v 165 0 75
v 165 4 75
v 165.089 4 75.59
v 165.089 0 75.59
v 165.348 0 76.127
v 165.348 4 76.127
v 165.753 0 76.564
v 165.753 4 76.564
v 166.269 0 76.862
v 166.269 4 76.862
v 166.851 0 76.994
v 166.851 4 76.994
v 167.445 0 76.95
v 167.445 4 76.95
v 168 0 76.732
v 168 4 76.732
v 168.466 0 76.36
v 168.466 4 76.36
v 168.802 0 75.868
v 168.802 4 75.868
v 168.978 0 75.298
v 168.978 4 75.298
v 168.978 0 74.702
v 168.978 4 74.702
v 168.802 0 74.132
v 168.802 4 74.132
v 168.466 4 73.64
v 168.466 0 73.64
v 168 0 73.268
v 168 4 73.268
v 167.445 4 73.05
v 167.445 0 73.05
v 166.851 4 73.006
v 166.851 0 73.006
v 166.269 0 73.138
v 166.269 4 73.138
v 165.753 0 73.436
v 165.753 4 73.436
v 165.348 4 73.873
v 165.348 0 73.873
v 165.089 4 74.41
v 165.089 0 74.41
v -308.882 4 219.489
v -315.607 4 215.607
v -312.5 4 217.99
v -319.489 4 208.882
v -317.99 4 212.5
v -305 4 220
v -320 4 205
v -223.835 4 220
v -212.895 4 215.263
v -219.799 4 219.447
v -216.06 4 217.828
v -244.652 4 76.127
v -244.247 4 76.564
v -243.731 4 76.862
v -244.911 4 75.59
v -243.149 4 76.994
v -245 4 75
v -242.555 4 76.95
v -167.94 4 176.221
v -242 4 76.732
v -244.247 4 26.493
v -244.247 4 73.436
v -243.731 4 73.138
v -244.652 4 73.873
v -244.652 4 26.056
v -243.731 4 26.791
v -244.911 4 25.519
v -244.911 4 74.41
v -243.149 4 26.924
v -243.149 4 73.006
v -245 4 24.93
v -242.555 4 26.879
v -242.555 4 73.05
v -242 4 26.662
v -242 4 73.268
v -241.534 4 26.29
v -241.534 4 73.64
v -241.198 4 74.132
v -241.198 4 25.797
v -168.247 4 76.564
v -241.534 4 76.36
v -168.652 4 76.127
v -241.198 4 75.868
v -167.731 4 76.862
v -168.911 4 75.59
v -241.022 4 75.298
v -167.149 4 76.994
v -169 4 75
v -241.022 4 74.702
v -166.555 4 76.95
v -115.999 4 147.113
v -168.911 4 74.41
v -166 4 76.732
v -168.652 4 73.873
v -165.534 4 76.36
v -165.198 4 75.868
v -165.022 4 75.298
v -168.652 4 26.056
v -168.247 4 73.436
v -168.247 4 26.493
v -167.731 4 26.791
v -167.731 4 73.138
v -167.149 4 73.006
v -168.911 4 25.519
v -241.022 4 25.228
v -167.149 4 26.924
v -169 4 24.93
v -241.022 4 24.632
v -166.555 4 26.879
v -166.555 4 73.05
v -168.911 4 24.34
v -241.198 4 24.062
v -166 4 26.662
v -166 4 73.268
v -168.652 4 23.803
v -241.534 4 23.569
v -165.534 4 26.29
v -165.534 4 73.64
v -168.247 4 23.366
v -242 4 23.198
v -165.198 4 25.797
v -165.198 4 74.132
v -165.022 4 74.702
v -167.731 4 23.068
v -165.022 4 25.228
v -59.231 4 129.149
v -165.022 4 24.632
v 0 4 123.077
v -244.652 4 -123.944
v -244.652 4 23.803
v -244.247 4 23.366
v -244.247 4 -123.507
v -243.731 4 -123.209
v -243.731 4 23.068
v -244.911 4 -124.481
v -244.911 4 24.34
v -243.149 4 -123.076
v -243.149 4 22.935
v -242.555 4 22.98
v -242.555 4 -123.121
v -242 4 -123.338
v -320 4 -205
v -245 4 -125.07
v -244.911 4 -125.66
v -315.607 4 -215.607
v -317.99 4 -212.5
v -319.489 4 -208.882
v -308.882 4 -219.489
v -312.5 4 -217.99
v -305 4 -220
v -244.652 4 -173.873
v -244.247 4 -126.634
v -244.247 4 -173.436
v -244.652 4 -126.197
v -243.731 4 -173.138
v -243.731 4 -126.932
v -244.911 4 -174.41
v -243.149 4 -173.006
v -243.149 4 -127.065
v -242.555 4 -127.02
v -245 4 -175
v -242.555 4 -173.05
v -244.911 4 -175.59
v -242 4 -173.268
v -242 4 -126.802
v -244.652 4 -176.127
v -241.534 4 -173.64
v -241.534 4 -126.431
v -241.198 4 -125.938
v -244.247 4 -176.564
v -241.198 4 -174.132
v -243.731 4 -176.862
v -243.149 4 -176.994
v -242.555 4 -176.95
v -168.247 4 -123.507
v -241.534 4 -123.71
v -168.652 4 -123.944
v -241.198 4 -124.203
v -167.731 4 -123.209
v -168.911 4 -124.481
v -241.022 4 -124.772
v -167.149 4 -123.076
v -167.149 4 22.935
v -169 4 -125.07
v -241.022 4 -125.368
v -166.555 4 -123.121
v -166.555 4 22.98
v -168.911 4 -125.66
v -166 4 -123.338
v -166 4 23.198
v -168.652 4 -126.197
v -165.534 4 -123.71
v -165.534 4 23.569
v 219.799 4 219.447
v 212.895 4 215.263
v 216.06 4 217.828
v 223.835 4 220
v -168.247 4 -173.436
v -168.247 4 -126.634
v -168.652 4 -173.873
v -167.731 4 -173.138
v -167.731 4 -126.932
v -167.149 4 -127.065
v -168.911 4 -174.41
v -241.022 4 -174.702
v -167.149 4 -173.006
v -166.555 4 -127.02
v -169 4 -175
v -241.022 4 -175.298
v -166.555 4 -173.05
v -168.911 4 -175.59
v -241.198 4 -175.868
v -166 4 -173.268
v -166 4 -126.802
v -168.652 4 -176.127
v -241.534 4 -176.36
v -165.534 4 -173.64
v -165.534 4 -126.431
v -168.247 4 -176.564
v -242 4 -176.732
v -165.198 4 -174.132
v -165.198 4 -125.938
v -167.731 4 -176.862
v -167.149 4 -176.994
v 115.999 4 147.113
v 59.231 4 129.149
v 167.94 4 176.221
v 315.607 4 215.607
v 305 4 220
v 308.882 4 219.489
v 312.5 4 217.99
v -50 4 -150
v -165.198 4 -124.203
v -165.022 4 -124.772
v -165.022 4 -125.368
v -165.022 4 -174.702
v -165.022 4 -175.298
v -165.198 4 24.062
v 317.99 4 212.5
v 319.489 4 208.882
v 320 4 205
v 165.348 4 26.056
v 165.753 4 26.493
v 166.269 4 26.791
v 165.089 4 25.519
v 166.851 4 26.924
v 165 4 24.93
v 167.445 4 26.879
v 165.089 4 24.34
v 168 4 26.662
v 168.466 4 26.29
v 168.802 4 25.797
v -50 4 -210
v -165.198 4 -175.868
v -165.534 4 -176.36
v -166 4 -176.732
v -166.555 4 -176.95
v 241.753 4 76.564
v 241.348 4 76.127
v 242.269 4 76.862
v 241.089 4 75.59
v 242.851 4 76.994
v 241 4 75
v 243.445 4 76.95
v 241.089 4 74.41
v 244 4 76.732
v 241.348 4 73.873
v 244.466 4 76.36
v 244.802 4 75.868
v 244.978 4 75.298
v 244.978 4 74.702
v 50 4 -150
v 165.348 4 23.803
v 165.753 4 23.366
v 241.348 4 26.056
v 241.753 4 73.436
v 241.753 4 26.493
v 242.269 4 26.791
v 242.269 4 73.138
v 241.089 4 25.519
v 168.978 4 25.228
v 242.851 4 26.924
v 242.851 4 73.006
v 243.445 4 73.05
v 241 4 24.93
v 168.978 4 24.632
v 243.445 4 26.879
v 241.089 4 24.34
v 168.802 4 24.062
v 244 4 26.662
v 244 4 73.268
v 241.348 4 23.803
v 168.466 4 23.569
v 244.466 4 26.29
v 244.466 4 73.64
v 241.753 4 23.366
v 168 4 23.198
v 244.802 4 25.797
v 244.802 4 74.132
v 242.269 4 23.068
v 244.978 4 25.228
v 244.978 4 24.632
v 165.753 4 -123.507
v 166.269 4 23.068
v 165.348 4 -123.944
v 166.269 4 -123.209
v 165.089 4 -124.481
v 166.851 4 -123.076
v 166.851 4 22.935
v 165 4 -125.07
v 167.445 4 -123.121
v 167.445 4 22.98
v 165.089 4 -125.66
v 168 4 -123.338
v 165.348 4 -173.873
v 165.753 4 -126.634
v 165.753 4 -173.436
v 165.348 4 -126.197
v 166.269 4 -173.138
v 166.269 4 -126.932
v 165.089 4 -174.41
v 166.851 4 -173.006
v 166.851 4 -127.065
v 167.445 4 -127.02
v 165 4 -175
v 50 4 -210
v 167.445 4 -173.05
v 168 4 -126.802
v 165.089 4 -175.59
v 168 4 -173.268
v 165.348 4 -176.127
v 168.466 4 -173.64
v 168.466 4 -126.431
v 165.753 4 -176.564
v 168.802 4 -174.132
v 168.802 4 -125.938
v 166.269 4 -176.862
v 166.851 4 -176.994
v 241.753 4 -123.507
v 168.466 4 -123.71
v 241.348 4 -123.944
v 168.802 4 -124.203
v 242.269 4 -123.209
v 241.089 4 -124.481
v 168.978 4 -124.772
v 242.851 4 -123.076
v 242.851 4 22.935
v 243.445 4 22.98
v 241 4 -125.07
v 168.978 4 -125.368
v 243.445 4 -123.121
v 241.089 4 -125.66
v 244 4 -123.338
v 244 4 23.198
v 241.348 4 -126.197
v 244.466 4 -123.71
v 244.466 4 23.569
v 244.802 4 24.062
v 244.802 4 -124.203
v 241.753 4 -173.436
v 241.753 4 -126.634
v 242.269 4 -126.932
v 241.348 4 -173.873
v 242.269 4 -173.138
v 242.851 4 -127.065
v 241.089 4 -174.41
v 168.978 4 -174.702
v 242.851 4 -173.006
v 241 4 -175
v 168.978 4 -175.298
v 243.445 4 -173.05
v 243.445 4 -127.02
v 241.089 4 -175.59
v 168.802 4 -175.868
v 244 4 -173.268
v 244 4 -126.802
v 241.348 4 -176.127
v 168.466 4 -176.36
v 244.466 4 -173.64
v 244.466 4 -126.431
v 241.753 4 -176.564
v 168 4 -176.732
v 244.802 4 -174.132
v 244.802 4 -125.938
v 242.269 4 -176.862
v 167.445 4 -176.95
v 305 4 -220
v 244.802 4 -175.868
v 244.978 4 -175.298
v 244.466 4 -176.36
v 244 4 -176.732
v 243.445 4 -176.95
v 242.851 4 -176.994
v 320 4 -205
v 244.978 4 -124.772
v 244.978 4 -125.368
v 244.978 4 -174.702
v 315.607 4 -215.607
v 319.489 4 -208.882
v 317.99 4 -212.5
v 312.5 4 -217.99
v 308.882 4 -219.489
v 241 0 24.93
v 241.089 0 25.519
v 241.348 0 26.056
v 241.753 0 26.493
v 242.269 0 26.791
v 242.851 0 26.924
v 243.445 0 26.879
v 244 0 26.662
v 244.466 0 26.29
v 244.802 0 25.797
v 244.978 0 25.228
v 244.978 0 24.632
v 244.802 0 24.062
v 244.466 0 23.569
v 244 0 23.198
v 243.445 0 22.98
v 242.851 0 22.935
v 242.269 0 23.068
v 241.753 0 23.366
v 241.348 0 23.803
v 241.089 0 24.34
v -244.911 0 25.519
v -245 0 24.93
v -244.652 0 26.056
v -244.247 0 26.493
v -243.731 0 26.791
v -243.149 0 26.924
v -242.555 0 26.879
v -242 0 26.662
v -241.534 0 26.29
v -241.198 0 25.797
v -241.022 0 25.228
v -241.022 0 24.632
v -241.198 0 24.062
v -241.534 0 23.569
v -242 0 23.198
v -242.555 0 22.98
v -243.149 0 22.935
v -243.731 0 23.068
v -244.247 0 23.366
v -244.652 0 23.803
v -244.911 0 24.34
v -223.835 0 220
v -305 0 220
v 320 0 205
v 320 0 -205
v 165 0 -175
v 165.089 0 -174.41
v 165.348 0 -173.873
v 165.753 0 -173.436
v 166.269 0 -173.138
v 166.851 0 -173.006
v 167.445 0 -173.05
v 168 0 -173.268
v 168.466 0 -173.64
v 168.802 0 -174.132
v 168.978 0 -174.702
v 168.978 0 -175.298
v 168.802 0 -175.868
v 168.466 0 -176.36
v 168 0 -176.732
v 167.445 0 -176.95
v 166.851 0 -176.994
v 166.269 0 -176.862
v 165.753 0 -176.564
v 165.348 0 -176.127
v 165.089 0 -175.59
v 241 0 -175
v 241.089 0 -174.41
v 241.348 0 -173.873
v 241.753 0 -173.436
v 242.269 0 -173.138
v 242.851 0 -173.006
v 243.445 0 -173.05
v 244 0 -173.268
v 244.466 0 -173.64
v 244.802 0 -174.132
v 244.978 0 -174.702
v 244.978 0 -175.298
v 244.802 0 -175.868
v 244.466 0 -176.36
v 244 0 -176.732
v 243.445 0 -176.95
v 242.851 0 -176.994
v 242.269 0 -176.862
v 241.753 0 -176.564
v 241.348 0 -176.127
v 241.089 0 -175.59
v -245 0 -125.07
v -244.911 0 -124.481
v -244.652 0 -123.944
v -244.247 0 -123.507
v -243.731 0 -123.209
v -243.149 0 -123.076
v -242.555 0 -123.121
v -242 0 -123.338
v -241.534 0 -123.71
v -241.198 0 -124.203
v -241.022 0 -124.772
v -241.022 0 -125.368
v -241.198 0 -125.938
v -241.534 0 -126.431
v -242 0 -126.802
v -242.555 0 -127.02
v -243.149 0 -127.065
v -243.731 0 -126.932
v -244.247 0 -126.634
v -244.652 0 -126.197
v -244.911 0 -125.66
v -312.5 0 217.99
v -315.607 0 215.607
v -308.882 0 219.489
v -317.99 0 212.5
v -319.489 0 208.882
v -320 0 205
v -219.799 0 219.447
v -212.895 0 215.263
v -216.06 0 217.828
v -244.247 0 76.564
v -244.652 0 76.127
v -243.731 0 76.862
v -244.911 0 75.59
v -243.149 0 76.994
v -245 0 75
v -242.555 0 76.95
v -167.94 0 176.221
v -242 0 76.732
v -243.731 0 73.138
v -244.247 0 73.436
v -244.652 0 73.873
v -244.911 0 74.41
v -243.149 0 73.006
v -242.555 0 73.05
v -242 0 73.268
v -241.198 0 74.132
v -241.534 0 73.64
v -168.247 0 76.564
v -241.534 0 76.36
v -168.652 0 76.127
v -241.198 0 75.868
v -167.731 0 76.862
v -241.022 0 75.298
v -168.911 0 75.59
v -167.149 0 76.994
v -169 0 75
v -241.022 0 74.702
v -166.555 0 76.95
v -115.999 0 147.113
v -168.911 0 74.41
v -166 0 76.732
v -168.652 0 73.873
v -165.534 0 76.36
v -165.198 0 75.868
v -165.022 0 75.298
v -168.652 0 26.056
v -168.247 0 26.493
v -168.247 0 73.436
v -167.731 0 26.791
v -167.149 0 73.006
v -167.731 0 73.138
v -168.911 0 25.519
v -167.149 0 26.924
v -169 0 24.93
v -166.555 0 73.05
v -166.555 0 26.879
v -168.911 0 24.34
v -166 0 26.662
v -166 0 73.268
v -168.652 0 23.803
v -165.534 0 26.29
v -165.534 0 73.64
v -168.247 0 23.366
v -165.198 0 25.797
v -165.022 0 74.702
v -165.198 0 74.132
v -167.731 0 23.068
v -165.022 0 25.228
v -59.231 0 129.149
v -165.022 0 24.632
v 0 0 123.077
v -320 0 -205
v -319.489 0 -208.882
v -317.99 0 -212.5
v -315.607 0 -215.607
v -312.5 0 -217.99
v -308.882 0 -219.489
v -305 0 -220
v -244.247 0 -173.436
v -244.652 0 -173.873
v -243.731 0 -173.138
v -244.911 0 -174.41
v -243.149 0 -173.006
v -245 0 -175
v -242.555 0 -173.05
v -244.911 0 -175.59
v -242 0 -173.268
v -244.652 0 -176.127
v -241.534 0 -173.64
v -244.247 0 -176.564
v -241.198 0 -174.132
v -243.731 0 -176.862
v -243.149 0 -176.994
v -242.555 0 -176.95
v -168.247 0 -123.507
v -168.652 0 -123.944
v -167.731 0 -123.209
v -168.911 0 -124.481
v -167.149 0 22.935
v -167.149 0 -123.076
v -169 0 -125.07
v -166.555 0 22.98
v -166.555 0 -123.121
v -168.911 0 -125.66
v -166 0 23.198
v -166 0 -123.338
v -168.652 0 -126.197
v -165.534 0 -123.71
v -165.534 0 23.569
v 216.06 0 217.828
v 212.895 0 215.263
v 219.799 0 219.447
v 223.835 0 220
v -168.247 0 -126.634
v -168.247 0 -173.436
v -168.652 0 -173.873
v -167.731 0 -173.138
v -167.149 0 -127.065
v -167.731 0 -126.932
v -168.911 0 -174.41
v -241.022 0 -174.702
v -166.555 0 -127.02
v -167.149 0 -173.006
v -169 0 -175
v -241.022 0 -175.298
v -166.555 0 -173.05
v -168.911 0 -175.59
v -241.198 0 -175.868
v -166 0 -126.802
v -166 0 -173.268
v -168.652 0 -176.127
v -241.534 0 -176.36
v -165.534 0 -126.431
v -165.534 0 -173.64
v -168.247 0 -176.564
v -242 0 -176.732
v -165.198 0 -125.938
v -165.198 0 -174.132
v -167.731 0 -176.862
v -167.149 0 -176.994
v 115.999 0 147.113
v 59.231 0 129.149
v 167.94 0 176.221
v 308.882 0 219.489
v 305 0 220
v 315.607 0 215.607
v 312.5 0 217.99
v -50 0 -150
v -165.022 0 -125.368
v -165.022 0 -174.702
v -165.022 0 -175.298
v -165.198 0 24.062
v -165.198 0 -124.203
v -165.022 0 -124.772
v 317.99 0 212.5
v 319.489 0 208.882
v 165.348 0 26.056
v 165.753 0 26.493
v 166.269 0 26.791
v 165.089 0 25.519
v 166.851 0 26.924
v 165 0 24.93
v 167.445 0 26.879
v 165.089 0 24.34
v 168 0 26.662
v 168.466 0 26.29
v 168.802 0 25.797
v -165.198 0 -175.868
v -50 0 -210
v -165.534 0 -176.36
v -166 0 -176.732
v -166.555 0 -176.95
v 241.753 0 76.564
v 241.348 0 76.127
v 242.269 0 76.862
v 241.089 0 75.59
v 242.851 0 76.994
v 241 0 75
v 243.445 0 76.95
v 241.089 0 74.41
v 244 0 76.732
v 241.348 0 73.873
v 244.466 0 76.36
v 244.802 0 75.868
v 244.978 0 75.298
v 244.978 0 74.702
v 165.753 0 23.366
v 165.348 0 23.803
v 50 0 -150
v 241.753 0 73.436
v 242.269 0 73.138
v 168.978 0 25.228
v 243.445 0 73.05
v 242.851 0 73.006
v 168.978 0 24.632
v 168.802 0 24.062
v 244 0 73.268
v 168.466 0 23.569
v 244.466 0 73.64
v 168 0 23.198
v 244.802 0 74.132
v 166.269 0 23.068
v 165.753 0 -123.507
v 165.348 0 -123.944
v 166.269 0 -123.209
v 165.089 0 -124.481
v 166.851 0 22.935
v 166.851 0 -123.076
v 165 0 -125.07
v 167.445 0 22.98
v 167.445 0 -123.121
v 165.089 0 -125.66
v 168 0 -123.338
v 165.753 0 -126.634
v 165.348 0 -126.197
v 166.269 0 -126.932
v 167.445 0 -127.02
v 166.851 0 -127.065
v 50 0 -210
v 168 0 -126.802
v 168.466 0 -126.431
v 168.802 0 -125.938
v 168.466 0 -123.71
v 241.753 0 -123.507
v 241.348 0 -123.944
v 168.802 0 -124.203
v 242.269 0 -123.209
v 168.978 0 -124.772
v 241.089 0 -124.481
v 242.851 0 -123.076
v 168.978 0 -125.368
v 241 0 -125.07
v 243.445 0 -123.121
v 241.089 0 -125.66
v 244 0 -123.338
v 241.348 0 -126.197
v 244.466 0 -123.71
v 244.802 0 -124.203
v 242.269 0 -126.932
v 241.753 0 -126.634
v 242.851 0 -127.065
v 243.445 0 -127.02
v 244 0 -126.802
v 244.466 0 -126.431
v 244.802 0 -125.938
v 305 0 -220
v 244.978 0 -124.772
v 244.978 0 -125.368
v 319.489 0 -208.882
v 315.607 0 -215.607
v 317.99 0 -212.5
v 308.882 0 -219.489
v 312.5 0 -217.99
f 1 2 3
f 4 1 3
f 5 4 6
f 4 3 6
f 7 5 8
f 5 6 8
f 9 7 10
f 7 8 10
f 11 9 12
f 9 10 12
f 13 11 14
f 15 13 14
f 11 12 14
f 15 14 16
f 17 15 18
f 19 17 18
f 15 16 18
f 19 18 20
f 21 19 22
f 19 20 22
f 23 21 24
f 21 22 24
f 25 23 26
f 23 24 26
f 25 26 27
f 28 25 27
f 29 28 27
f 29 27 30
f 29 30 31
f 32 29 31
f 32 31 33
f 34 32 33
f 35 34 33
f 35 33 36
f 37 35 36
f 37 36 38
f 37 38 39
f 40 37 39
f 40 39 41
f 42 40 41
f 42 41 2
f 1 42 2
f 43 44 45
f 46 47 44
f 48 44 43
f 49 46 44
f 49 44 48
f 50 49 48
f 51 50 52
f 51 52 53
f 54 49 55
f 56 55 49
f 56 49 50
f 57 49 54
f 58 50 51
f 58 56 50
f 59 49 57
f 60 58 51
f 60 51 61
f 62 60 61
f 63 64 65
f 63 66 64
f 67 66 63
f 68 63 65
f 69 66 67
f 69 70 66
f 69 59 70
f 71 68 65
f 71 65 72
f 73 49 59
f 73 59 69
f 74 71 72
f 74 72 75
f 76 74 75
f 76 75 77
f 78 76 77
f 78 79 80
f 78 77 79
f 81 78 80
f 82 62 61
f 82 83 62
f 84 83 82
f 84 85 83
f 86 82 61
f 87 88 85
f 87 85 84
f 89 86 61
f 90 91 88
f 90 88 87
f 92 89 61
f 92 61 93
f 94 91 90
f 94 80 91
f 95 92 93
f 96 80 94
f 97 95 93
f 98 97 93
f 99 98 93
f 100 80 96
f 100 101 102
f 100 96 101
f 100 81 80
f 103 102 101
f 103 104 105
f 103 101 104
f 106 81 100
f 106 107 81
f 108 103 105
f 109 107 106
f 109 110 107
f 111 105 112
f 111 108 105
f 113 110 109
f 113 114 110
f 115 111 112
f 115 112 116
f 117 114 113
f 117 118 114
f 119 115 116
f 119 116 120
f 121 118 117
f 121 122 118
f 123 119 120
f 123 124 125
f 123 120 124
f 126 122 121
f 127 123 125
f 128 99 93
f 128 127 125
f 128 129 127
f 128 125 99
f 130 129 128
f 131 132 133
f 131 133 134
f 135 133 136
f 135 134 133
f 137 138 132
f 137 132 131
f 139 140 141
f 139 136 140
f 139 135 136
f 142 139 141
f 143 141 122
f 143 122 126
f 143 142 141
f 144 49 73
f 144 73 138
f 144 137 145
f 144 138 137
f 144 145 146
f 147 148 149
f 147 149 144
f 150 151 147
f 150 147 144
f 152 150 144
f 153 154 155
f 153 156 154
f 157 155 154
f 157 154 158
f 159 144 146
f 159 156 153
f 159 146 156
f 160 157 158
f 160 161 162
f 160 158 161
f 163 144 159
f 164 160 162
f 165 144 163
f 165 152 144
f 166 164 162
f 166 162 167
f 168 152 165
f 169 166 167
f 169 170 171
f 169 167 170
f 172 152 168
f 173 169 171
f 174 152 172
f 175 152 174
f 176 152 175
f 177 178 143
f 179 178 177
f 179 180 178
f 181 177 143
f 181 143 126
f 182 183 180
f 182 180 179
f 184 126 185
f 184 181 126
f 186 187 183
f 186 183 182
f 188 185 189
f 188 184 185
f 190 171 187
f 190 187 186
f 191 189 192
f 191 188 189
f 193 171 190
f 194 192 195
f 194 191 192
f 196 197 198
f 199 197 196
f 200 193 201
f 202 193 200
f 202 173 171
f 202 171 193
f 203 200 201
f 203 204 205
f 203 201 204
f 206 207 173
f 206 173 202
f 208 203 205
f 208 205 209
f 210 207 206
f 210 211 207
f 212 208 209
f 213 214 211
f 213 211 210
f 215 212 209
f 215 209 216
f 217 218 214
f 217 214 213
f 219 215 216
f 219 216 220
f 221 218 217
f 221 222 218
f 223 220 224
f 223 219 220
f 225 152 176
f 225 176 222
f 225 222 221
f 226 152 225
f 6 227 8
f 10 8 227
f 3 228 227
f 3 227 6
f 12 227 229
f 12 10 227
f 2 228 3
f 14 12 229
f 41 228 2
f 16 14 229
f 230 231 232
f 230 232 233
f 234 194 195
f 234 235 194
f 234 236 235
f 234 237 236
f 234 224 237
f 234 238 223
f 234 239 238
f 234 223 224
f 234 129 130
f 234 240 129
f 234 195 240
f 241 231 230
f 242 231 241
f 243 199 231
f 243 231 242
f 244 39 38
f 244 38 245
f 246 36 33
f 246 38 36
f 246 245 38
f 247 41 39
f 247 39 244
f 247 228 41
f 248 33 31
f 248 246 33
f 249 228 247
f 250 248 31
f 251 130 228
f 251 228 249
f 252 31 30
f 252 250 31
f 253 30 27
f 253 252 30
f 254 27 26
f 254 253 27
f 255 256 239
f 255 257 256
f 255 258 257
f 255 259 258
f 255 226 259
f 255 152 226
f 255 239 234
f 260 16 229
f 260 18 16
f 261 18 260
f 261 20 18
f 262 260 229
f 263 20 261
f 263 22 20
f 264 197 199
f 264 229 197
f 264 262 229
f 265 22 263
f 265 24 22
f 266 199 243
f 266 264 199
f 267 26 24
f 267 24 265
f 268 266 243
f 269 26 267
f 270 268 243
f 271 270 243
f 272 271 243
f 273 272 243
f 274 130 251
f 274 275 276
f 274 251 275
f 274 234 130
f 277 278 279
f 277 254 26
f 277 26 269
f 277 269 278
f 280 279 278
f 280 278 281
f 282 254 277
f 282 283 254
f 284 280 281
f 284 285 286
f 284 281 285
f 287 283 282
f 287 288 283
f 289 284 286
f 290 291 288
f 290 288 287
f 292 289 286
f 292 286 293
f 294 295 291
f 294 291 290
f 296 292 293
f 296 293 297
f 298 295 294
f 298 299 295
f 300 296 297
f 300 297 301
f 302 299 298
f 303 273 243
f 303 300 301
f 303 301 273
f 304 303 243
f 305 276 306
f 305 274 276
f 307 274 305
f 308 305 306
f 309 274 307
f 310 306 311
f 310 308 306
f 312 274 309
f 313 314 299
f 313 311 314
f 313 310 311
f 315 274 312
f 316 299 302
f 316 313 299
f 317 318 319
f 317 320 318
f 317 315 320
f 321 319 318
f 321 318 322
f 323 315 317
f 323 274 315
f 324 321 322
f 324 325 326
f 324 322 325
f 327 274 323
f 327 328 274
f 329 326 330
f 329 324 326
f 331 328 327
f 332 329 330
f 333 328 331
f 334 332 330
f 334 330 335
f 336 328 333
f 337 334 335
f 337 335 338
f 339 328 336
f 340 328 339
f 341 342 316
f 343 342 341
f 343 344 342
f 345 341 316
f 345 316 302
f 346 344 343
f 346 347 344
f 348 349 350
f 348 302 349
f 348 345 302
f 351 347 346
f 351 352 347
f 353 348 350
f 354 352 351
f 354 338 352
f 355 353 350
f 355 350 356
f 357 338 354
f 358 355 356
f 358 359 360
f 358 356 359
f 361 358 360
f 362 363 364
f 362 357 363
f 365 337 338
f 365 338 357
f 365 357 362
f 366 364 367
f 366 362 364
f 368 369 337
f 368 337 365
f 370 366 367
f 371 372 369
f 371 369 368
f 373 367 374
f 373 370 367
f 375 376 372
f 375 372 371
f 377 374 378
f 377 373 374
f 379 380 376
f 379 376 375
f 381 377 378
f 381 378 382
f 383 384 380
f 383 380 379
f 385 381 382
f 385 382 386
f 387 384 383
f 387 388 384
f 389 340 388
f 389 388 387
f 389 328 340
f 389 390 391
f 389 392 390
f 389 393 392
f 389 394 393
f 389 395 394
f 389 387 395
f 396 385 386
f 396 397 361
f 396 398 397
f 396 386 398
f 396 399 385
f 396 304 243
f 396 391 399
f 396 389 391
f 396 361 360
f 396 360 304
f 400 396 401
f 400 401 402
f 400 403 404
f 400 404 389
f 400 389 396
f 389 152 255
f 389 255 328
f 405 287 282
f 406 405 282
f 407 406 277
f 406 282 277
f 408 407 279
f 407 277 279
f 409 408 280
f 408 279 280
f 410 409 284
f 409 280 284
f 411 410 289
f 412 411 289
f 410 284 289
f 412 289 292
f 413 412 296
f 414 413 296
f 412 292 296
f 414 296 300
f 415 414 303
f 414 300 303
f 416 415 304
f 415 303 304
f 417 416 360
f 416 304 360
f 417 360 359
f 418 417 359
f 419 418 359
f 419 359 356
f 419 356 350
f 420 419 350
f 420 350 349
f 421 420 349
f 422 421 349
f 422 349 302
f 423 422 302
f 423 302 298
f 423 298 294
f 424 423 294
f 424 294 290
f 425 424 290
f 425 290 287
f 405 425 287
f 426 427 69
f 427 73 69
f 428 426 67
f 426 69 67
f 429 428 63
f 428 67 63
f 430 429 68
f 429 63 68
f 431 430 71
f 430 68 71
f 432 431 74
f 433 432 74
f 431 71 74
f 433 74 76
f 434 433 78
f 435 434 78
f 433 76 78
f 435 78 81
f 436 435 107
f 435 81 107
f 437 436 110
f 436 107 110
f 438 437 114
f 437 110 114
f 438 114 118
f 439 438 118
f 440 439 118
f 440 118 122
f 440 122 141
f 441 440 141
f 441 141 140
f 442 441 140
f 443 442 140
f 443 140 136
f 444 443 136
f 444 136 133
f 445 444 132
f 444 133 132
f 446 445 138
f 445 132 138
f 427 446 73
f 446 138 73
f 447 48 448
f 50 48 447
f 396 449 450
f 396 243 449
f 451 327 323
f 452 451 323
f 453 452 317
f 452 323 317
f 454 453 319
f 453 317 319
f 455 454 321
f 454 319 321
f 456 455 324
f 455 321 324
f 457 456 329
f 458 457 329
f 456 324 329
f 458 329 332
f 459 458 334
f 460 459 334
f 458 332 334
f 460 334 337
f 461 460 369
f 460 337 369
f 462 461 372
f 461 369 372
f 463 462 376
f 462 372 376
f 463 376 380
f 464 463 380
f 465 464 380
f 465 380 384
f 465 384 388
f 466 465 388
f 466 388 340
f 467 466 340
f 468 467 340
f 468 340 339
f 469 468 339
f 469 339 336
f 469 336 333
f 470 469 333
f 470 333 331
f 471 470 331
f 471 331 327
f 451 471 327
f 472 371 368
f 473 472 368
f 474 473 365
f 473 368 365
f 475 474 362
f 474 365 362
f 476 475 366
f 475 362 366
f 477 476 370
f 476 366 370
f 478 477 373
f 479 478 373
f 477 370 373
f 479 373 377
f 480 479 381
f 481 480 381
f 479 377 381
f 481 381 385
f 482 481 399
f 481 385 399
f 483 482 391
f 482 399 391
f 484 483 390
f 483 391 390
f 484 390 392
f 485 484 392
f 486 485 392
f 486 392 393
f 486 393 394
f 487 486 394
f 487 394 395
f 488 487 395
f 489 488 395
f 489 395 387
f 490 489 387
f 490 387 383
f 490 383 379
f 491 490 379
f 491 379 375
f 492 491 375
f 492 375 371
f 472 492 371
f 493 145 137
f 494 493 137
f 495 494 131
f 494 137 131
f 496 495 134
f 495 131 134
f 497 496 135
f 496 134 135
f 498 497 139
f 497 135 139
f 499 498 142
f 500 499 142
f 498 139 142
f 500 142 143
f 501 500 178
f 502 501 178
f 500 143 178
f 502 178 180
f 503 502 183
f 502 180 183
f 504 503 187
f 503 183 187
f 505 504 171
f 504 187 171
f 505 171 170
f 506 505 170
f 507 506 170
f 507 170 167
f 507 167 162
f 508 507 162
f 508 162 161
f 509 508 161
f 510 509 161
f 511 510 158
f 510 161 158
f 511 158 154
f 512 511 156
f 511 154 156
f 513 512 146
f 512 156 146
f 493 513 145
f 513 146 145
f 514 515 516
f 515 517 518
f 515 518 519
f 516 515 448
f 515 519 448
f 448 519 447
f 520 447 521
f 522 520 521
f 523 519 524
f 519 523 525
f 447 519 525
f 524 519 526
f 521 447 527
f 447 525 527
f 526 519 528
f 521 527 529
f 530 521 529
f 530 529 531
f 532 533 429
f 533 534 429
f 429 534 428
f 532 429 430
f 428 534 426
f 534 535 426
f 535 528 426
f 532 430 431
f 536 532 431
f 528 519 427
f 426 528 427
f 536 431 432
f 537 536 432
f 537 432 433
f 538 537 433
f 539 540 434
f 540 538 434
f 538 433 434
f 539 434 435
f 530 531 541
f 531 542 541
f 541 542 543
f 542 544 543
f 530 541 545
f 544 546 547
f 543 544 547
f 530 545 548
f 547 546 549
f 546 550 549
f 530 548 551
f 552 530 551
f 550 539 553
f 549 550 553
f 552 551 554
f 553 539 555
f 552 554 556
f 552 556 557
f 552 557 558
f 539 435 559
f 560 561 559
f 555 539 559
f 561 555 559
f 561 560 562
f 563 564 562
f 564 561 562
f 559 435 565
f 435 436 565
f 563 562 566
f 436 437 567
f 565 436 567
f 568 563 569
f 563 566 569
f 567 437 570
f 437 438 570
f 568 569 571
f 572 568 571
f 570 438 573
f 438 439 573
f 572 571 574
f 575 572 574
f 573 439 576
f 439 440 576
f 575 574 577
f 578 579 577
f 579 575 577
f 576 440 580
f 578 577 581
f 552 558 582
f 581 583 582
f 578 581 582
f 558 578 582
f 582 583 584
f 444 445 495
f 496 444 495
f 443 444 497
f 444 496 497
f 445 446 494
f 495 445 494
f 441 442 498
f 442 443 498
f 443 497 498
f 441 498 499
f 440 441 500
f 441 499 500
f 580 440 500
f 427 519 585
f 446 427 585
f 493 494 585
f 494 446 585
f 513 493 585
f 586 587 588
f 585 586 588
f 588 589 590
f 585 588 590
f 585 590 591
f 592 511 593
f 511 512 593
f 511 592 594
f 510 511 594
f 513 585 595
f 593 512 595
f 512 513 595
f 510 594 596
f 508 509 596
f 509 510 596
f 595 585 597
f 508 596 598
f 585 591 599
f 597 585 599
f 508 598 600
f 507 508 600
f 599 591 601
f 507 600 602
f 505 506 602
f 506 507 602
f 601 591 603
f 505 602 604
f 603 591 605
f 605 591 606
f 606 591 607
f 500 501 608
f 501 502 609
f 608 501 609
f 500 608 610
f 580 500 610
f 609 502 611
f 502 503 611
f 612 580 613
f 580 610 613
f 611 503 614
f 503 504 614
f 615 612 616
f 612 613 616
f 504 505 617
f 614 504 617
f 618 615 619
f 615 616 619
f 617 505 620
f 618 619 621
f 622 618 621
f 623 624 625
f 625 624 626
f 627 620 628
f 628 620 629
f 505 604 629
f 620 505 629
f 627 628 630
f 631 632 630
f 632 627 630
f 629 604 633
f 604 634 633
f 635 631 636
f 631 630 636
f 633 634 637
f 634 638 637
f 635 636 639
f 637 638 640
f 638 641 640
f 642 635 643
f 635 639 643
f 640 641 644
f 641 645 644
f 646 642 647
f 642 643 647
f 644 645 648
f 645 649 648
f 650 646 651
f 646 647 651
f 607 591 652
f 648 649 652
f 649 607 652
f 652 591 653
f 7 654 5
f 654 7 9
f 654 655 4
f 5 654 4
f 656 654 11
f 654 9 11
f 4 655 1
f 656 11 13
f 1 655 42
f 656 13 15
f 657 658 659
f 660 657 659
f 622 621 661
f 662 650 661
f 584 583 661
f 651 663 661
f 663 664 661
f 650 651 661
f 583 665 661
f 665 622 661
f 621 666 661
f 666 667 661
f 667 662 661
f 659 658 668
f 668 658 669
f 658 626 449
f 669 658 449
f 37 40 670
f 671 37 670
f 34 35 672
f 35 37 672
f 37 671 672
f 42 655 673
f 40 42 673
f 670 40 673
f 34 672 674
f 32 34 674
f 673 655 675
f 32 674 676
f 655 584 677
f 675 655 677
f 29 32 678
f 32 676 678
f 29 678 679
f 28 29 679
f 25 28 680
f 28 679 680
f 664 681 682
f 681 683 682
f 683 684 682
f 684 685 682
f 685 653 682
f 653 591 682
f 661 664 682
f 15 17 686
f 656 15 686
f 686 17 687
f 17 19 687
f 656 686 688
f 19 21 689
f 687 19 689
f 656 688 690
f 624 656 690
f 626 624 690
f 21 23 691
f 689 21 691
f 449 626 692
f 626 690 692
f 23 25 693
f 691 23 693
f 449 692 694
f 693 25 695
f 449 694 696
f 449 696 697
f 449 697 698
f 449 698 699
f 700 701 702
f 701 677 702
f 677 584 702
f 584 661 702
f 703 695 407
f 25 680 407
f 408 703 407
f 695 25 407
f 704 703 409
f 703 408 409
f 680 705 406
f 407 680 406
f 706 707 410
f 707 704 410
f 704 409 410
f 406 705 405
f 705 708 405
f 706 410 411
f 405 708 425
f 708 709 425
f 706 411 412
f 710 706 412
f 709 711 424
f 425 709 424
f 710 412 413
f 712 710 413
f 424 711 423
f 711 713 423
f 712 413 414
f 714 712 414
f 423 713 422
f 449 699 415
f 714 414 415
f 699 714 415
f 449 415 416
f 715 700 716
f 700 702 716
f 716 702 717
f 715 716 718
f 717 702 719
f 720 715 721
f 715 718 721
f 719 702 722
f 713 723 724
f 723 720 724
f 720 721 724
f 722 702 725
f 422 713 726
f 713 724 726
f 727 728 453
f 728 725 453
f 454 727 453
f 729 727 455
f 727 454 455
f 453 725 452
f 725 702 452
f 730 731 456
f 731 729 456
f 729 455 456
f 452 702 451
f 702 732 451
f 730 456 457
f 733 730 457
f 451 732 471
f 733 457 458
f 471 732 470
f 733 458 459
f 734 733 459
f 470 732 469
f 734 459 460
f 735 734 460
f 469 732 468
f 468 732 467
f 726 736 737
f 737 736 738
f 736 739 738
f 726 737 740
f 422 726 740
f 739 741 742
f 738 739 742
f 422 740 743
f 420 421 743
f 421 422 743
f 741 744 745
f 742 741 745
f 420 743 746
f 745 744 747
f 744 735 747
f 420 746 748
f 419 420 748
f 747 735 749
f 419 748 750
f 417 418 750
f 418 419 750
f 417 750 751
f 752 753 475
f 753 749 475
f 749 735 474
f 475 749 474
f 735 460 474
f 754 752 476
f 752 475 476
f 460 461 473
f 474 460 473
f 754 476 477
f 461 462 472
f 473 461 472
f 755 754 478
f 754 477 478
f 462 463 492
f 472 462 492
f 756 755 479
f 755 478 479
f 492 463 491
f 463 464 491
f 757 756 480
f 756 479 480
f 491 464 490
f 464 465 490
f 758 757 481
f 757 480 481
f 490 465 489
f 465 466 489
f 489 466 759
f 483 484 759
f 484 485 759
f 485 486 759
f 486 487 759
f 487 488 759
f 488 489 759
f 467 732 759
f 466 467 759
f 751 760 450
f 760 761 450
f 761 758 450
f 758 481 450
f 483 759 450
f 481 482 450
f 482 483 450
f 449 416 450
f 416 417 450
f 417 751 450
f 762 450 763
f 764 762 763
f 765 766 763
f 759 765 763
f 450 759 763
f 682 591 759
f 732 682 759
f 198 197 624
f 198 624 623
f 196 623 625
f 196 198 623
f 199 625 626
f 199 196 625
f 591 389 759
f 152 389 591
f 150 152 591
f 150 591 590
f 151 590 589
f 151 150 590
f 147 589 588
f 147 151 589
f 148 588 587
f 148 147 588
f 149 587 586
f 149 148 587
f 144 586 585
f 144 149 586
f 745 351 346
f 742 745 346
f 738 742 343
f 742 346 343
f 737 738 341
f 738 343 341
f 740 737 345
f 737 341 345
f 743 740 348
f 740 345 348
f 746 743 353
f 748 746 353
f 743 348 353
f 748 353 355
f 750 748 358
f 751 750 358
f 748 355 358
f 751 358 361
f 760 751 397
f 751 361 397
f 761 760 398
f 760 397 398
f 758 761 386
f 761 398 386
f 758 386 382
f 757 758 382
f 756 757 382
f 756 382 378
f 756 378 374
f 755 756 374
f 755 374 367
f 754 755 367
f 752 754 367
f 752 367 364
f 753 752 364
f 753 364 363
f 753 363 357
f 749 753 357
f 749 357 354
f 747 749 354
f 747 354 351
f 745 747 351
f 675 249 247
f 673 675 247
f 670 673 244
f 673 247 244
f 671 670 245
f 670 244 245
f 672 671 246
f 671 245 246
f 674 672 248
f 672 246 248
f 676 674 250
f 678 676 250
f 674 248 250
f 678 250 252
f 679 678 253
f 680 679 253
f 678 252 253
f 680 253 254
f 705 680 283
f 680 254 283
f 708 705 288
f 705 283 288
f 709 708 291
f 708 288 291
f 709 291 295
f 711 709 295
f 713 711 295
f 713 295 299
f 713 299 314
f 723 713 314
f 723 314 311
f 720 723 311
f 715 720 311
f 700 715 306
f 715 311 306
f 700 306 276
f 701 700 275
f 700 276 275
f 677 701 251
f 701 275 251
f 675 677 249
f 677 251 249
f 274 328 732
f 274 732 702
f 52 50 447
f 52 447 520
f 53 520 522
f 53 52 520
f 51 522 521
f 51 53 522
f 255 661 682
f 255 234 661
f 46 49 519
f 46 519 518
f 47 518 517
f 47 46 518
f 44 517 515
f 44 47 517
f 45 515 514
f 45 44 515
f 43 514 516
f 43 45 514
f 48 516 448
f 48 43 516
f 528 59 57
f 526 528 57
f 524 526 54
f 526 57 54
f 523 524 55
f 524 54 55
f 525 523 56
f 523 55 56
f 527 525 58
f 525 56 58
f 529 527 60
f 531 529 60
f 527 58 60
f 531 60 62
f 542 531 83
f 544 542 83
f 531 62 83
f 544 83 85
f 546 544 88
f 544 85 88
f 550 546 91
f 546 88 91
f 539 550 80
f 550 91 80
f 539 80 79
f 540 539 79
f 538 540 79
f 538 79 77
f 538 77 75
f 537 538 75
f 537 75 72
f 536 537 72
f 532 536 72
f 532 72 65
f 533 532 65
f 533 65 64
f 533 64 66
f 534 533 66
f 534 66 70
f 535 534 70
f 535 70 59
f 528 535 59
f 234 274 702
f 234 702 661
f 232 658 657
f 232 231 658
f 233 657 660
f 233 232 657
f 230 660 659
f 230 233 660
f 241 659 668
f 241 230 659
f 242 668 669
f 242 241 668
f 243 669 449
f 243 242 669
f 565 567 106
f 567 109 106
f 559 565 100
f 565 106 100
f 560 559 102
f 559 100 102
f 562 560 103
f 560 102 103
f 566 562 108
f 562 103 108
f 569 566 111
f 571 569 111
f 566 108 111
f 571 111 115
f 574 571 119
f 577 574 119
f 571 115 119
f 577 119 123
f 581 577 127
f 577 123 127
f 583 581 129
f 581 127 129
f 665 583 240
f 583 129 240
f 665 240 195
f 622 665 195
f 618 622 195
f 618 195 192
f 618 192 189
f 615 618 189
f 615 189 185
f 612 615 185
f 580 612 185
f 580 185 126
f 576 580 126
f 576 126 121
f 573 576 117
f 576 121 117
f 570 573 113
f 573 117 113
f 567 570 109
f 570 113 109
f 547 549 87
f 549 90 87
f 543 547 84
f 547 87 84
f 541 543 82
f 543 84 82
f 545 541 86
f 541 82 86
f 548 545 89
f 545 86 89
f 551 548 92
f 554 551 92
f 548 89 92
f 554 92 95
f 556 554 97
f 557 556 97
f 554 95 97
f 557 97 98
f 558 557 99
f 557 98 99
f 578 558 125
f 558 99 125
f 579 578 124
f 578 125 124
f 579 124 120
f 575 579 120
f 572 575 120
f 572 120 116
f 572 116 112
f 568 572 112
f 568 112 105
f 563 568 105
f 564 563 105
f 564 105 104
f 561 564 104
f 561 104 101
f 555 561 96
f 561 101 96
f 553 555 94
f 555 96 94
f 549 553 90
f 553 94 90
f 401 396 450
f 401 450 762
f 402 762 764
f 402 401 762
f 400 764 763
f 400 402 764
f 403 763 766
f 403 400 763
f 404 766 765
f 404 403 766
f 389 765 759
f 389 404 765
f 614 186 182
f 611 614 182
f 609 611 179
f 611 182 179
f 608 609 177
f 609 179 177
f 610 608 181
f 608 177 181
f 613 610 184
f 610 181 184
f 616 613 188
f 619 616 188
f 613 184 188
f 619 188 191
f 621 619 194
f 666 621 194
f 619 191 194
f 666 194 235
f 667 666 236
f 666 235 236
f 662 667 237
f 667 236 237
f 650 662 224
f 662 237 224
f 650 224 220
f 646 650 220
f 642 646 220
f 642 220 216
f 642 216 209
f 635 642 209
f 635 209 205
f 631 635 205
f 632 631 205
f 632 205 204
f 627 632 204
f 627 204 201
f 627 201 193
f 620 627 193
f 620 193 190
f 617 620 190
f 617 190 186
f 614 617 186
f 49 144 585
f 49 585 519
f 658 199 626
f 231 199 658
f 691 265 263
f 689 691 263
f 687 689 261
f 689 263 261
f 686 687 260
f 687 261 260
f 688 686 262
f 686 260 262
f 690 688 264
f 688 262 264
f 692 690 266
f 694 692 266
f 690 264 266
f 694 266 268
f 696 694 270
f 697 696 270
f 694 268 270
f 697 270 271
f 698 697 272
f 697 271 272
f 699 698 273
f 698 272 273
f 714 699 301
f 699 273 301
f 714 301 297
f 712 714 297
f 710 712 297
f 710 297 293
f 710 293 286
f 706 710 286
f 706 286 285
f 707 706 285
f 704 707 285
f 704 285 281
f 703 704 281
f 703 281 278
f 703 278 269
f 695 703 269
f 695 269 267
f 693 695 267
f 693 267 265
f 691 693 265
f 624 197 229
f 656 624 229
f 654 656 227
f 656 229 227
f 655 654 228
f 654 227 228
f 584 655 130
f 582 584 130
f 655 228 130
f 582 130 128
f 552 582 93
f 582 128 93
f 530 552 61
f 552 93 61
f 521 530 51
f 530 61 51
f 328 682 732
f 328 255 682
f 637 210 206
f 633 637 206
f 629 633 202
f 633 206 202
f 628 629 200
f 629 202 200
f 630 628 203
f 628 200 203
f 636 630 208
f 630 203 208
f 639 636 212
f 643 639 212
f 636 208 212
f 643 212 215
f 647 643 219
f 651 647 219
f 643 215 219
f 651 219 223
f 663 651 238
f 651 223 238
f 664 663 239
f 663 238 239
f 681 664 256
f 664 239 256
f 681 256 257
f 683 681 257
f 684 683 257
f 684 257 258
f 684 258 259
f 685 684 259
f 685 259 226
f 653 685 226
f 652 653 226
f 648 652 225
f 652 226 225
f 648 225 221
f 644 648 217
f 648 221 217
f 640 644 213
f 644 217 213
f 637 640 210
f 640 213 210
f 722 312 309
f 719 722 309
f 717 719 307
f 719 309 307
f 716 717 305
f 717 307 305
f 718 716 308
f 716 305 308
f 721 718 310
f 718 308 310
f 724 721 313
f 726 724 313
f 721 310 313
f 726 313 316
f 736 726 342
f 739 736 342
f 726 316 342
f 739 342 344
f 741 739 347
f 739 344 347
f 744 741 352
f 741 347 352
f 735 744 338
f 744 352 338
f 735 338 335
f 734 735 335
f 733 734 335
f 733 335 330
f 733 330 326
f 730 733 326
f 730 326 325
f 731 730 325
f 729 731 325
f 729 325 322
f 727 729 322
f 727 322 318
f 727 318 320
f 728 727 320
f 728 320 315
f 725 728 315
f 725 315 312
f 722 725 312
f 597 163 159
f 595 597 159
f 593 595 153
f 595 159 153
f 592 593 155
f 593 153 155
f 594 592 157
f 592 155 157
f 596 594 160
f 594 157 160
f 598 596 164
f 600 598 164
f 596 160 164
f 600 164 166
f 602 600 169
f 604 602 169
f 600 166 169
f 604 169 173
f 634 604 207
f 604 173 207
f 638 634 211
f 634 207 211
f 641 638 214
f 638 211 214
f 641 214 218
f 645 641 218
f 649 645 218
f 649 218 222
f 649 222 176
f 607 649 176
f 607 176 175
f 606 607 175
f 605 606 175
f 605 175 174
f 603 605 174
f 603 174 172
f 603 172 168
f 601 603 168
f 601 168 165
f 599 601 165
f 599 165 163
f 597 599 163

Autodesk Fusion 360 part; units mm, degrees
sketch "Esquisse1" plane through (0, 0, 0) normal (0, 1, 0) x (1, 0, 0)
  line L0 (-305, 225) -> (305, 225)
  line L1 (325, 205) -> (325, -205)
  line L2 (305, -225) -> (223.8346, -225)
  line L3 (-325, -205) -> (-325, 205)
  line L4 (-325, 225) -> (325, -225) construction
  line L5 (325, 225) -> (-325, -225) construction
  arc A0 (209.2489, -218.6842) -> (-209.2489, -218.6842) centre (0, -415) ccw
  line L6 (-367.4671, -125) -> (350, -125) construction
  line L7 (-305, -225) -> (-223.8346, -225)
  line L8 (215, -225) -> (325, -225)
  arc A1 (209.2489, -218.6842) -> (223.8346, -225) centre (223.8346, -205) ccw
  arc A2 (305, -225) -> (325, -205) centre (305, -205) ccw
  arc A3 (325, 205) -> (305, 225) centre (305, 205) ccw
  arc A4 (-305, 225) -> (-325, 205) centre (-305, 205) ccw
  arc A5 (-325, -205) -> (-305, -225) centre (-305, -205) ccw
  arc A6 (-223.8346, -225) -> (-209.2489, -218.6842) centre (-223.8346, -205) ccw
  point P0 (-215, -225)
  dimension "d12" = 650
  dimension "d13" = 450
  dimension "d14" = 110
  dimension "d15" = 110
  dimension "d16" = 100
  dimension "d20" = 190
  dimension "d21" = 20
extrude "Extrusion1" add sketch "Esquisse1" along normal blind 4
sketch "Esquisse2" plane through (0, 4, 0) normal (0, 1, 0) x (-1, 0, 0)
  arc A0 (325, 205) -> (305, 225) centre (305, 205) ccw
  line L0 (305, 225) -> (223.8346, 225)
  arc A1 (223.8346, 225) -> (209.2489, 218.6842) centre (223.8346, 205) ccw
  arc A2 (-209.2489, 218.6842) -> (209.2489, 218.6842) centre (0, 415) ccw
  arc A3 (-209.2489, 218.6842) -> (-223.8346, 225) centre (-223.8346, 205) ccw
  line L1 (-223.8346, 225) -> (-305, 225)
  arc A4 (-305, 225) -> (-325, 205) centre (-305, 205) ccw
  line L2 (-325, 205) -> (-325, -205)
  arc A5 (-325, -205) -> (-305, -225) centre (-305, -205) ccw
  line L3 (-305, -225) -> (305, -225)
  arc A6 (305, -225) -> (325, -205) centre (305, -205) ccw
  line L4 (325, -205) -> (325, 205)
  line L5 (-50, -150) -> (50, -150)
  line L6 (50, -150) -> (50, -210)
  line L7 (50, -210) -> (-50, -210)
  line L8 (50, -210) -> (-50, -150) construction
  line L9 (-50, -210) -> (-50, -150)
  line L10 (-50, -210) -> (50, -150) construction
  point P0 (0, -275)
  point P1 (0, -180)
  dimension "d24" = 60
  dimension "d25" = 100
  dimension "d26" = 15
extrude "Extrusion2" cut sketch "Esquisse2" against normal blind 50 contours L5 L6 L7 L9
sketch "Esquisse3" plane through (0, 4, 0) normal (0, 1, 0) x (-1, 0, 0)
  line L0 (50, -150) -> (50, -210)
  line L1 (50, -210) -> (-50, -210)
  line L2 (-50, -210) -> (-50, -150)
  line L3 (-50, -150) -> (50, -150)
  arc A0 (325, 205) -> (305, 225) centre (305, 205) ccw
  line L4 (305, 225) -> (223.8346, 225)
  arc A1 (223.8346, 225) -> (209.2489, 218.6842) centre (223.8346, 205) ccw
  arc A2 (-209.2489, 218.6842) -> (209.2489, 218.6842) centre (0, 415) ccw
  arc A3 (-209.2489, 218.6842) -> (-223.8346, 225) centre (-223.8346, 205) ccw
  line L5 (-223.8346, 225) -> (-305, 225)
  arc A4 (-305, 225) -> (-325, 205) centre (-305, 205) ccw
  line L6 (-325, 205) -> (-325, -205)
  arc A5 (-325, -205) -> (-305, -225) centre (-305, -205) ccw
  line L7 (-305, -225) -> (305, -225)
  arc A6 (305, -225) -> (325, -205) centre (305, -205) ccw
  line L8 (325, -205) -> (325, 205)
  circle A7 centre (167, 75) radius 2
  circle A8 centre (243, 75) radius 2
  circle A9 centre (243, -175) radius 2
  circle A10 centre (243, -125.0704) radius 2
  circle A11 centre (167, 24.9296) radius 2
  circle A12 centre (243, 24.9296) radius 2
  circle A13 centre (167, -175) radius 2
  circle A14 centre (167, -125.0704) radius 2
  line L9 (205, -263.7962) -> (205, 261.6023) construction
  line L10 (0, -279.9296) -> (0, 210.0704) construction
  circle A15 centre (-243, 75) radius 2
  circle A16 centre (-167, -175) radius 2
  circle A17 centre (-167, -125.0704) radius 2
  circle A18 centre (-243, -125.0704) radius 2
  circle A19 centre (-243, 24.9296) radius 2
  circle A20 centre (-243, -175) radius 2
  circle A21 centre (-167, 75) radius 2
  circle A22 centre (-167, 24.9296) radius 2
  line L11 (-205, -263.7962) -> (-205, 261.6023) construction
  dimension "d29" = 4
  dimension "d30" = 38
  dimension "d31" = 4
  dimension "d32" = 38
  dimension "d33" = 205
  dimension "d34" = 50
extrude "Extrusion3" cut sketch "Esquisse3" against normal blind 25 contours A7 | A8 | A9 | A10 | A11 | A12 | A13 | A14 | A15 | A16 | A17 | A18 | A19 | A20 | A21 | A22
sketch "Esquisse4" plane through (0, 4, 0) normal (0, 1, 0) x (-1, 0, 0)
  circle A0 centre (-243, 24.9296) radius 2
  circle A1 centre (-167, -175) radius 2
  circle A2 centre (167, -175) radius 2
  circle A3 centre (167, 75) radius 2
  circle A4 centre (167, 24.9296) radius 2
  circle A5 centre (243, -125.0704) radius 2
  circle A6 centre (-167, -125.0704) radius 2
  circle A7 centre (-243, 75) radius 2
  circle A8 centre (-167, 24.9296) radius 2
  circle A9 centre (-243, -175) radius 2
  circle A10 centre (243, -175) radius 2
  circle A11 centre (243, 75) radius 2
  circle A12 centre (243, 24.9296) radius 2
  circle A13 centre (167, -125.0704) radius 2
  circle A14 centre (-243, -125.0704) radius 2
  circle A15 centre (-167, 75) radius 2
  line L0 (50, -150) -> (50, -210)
  line L1 (50, -210) -> (-50, -210)
  line L2 (-50, -210) -> (-50, -150)
  line L3 (-50, -150) -> (50, -150)
  arc A16 (325, 205) -> (305, 225) centre (305, 205) ccw
  line L4 (305, 225) -> (223.8346, 225)
  arc A17 (223.8346, 225) -> (209.2489, 218.6842) centre (223.8346, 205) ccw
  arc A18 (-209.2489, 218.6842) -> (209.2489, 218.6842) centre (0, 415) ccw
  arc A19 (-209.2489, 218.6842) -> (-223.8346, 225) centre (-223.8346, 205) ccw
  line L5 (-223.8346, 225) -> (-305, 225)
  arc A20 (-305, 225) -> (-325, 205) centre (-305, 205) ccw
  line L6 (-325, 205) -> (-325, -205)
  arc A21 (-325, -205) -> (-305, -225) centre (-305, -205) ccw
  line L7 (-305, -225) -> (305, -225)
  arc A22 (305, -225) -> (325, -205) centre (305, -205) ccw
  line L8 (325, -205) -> (325, 205)
  line L9 (305, 220) -> (223.8346, 220)
  arc A23 (223.8346, 220) -> (212.8953, 215.2631) centre (223.8346, 205) ccw
  arc A24 (-212.8953, 215.2631) -> (212.8953, 215.2631) centre (0, 415) ccw
  arc A25 (-212.8953, 215.2631) -> (-223.8346, 220) centre (-223.8346, 205) ccw
  line L10 (-223.8346, 220) -> (-305, 220)
  arc A26 (-305, 220) -> (-320, 205) centre (-305, 205) ccw
  line L11 (-320, 205) -> (-320, -205)
  arc A27 (-320, -205) -> (-305, -220) centre (-305, -205) ccw
  line L12 (-305, -220) -> (305, -220)
  arc A28 (305, -220) -> (320, -205) centre (305, -205) ccw
  line L13 (320, -205) -> (320, 205)
  arc A29 (320, 205) -> (305, 220) centre (305, 205) ccw
  dimension "d37" = -5
extrude "Extrusion4" cut sketch "Esquisse4" against normal blind 50 contours A16 L4 A17 A18 A19 L5 A20 L6 A21 L7 A22 L8
